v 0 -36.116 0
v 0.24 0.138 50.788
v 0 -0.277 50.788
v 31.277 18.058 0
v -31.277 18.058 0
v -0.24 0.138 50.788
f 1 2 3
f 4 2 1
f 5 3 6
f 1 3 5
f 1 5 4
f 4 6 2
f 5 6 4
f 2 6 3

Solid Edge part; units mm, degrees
sketch "Sketch1" plane through (0, 0, 0) normal (0, 0, 1) x (1, 0, 0)
  line L0 (-0.0293, -36.1666) -> (31.3359, 18.0579)
  line L1 (31.3359, 18.0579) -> (-31.3066, 18.1087)
  line L2 (-31.3066, 18.1087) -> (-0.0293, -36.1666)
extrude "Protrusion1" add sketch "Sketch1" along normal blind 50.788
sketch "Sketch2" plane through (0, 0, 0) normal (1, 0, 0) x (0, 1, 0)
  line L0 (0, 51.1801) -> (18.0579, 0)
extrude "ExtrudedCutout_14" cut sketch "Sketch2" along normal mid plane 199.174 material side at (0, 9.0761, 25.6067)
pattern_circular "Pattern1" count 3 over 360 about axis through (0, 0, 0) along (0, 0, 1) of "ExtrudedCutout_14"
